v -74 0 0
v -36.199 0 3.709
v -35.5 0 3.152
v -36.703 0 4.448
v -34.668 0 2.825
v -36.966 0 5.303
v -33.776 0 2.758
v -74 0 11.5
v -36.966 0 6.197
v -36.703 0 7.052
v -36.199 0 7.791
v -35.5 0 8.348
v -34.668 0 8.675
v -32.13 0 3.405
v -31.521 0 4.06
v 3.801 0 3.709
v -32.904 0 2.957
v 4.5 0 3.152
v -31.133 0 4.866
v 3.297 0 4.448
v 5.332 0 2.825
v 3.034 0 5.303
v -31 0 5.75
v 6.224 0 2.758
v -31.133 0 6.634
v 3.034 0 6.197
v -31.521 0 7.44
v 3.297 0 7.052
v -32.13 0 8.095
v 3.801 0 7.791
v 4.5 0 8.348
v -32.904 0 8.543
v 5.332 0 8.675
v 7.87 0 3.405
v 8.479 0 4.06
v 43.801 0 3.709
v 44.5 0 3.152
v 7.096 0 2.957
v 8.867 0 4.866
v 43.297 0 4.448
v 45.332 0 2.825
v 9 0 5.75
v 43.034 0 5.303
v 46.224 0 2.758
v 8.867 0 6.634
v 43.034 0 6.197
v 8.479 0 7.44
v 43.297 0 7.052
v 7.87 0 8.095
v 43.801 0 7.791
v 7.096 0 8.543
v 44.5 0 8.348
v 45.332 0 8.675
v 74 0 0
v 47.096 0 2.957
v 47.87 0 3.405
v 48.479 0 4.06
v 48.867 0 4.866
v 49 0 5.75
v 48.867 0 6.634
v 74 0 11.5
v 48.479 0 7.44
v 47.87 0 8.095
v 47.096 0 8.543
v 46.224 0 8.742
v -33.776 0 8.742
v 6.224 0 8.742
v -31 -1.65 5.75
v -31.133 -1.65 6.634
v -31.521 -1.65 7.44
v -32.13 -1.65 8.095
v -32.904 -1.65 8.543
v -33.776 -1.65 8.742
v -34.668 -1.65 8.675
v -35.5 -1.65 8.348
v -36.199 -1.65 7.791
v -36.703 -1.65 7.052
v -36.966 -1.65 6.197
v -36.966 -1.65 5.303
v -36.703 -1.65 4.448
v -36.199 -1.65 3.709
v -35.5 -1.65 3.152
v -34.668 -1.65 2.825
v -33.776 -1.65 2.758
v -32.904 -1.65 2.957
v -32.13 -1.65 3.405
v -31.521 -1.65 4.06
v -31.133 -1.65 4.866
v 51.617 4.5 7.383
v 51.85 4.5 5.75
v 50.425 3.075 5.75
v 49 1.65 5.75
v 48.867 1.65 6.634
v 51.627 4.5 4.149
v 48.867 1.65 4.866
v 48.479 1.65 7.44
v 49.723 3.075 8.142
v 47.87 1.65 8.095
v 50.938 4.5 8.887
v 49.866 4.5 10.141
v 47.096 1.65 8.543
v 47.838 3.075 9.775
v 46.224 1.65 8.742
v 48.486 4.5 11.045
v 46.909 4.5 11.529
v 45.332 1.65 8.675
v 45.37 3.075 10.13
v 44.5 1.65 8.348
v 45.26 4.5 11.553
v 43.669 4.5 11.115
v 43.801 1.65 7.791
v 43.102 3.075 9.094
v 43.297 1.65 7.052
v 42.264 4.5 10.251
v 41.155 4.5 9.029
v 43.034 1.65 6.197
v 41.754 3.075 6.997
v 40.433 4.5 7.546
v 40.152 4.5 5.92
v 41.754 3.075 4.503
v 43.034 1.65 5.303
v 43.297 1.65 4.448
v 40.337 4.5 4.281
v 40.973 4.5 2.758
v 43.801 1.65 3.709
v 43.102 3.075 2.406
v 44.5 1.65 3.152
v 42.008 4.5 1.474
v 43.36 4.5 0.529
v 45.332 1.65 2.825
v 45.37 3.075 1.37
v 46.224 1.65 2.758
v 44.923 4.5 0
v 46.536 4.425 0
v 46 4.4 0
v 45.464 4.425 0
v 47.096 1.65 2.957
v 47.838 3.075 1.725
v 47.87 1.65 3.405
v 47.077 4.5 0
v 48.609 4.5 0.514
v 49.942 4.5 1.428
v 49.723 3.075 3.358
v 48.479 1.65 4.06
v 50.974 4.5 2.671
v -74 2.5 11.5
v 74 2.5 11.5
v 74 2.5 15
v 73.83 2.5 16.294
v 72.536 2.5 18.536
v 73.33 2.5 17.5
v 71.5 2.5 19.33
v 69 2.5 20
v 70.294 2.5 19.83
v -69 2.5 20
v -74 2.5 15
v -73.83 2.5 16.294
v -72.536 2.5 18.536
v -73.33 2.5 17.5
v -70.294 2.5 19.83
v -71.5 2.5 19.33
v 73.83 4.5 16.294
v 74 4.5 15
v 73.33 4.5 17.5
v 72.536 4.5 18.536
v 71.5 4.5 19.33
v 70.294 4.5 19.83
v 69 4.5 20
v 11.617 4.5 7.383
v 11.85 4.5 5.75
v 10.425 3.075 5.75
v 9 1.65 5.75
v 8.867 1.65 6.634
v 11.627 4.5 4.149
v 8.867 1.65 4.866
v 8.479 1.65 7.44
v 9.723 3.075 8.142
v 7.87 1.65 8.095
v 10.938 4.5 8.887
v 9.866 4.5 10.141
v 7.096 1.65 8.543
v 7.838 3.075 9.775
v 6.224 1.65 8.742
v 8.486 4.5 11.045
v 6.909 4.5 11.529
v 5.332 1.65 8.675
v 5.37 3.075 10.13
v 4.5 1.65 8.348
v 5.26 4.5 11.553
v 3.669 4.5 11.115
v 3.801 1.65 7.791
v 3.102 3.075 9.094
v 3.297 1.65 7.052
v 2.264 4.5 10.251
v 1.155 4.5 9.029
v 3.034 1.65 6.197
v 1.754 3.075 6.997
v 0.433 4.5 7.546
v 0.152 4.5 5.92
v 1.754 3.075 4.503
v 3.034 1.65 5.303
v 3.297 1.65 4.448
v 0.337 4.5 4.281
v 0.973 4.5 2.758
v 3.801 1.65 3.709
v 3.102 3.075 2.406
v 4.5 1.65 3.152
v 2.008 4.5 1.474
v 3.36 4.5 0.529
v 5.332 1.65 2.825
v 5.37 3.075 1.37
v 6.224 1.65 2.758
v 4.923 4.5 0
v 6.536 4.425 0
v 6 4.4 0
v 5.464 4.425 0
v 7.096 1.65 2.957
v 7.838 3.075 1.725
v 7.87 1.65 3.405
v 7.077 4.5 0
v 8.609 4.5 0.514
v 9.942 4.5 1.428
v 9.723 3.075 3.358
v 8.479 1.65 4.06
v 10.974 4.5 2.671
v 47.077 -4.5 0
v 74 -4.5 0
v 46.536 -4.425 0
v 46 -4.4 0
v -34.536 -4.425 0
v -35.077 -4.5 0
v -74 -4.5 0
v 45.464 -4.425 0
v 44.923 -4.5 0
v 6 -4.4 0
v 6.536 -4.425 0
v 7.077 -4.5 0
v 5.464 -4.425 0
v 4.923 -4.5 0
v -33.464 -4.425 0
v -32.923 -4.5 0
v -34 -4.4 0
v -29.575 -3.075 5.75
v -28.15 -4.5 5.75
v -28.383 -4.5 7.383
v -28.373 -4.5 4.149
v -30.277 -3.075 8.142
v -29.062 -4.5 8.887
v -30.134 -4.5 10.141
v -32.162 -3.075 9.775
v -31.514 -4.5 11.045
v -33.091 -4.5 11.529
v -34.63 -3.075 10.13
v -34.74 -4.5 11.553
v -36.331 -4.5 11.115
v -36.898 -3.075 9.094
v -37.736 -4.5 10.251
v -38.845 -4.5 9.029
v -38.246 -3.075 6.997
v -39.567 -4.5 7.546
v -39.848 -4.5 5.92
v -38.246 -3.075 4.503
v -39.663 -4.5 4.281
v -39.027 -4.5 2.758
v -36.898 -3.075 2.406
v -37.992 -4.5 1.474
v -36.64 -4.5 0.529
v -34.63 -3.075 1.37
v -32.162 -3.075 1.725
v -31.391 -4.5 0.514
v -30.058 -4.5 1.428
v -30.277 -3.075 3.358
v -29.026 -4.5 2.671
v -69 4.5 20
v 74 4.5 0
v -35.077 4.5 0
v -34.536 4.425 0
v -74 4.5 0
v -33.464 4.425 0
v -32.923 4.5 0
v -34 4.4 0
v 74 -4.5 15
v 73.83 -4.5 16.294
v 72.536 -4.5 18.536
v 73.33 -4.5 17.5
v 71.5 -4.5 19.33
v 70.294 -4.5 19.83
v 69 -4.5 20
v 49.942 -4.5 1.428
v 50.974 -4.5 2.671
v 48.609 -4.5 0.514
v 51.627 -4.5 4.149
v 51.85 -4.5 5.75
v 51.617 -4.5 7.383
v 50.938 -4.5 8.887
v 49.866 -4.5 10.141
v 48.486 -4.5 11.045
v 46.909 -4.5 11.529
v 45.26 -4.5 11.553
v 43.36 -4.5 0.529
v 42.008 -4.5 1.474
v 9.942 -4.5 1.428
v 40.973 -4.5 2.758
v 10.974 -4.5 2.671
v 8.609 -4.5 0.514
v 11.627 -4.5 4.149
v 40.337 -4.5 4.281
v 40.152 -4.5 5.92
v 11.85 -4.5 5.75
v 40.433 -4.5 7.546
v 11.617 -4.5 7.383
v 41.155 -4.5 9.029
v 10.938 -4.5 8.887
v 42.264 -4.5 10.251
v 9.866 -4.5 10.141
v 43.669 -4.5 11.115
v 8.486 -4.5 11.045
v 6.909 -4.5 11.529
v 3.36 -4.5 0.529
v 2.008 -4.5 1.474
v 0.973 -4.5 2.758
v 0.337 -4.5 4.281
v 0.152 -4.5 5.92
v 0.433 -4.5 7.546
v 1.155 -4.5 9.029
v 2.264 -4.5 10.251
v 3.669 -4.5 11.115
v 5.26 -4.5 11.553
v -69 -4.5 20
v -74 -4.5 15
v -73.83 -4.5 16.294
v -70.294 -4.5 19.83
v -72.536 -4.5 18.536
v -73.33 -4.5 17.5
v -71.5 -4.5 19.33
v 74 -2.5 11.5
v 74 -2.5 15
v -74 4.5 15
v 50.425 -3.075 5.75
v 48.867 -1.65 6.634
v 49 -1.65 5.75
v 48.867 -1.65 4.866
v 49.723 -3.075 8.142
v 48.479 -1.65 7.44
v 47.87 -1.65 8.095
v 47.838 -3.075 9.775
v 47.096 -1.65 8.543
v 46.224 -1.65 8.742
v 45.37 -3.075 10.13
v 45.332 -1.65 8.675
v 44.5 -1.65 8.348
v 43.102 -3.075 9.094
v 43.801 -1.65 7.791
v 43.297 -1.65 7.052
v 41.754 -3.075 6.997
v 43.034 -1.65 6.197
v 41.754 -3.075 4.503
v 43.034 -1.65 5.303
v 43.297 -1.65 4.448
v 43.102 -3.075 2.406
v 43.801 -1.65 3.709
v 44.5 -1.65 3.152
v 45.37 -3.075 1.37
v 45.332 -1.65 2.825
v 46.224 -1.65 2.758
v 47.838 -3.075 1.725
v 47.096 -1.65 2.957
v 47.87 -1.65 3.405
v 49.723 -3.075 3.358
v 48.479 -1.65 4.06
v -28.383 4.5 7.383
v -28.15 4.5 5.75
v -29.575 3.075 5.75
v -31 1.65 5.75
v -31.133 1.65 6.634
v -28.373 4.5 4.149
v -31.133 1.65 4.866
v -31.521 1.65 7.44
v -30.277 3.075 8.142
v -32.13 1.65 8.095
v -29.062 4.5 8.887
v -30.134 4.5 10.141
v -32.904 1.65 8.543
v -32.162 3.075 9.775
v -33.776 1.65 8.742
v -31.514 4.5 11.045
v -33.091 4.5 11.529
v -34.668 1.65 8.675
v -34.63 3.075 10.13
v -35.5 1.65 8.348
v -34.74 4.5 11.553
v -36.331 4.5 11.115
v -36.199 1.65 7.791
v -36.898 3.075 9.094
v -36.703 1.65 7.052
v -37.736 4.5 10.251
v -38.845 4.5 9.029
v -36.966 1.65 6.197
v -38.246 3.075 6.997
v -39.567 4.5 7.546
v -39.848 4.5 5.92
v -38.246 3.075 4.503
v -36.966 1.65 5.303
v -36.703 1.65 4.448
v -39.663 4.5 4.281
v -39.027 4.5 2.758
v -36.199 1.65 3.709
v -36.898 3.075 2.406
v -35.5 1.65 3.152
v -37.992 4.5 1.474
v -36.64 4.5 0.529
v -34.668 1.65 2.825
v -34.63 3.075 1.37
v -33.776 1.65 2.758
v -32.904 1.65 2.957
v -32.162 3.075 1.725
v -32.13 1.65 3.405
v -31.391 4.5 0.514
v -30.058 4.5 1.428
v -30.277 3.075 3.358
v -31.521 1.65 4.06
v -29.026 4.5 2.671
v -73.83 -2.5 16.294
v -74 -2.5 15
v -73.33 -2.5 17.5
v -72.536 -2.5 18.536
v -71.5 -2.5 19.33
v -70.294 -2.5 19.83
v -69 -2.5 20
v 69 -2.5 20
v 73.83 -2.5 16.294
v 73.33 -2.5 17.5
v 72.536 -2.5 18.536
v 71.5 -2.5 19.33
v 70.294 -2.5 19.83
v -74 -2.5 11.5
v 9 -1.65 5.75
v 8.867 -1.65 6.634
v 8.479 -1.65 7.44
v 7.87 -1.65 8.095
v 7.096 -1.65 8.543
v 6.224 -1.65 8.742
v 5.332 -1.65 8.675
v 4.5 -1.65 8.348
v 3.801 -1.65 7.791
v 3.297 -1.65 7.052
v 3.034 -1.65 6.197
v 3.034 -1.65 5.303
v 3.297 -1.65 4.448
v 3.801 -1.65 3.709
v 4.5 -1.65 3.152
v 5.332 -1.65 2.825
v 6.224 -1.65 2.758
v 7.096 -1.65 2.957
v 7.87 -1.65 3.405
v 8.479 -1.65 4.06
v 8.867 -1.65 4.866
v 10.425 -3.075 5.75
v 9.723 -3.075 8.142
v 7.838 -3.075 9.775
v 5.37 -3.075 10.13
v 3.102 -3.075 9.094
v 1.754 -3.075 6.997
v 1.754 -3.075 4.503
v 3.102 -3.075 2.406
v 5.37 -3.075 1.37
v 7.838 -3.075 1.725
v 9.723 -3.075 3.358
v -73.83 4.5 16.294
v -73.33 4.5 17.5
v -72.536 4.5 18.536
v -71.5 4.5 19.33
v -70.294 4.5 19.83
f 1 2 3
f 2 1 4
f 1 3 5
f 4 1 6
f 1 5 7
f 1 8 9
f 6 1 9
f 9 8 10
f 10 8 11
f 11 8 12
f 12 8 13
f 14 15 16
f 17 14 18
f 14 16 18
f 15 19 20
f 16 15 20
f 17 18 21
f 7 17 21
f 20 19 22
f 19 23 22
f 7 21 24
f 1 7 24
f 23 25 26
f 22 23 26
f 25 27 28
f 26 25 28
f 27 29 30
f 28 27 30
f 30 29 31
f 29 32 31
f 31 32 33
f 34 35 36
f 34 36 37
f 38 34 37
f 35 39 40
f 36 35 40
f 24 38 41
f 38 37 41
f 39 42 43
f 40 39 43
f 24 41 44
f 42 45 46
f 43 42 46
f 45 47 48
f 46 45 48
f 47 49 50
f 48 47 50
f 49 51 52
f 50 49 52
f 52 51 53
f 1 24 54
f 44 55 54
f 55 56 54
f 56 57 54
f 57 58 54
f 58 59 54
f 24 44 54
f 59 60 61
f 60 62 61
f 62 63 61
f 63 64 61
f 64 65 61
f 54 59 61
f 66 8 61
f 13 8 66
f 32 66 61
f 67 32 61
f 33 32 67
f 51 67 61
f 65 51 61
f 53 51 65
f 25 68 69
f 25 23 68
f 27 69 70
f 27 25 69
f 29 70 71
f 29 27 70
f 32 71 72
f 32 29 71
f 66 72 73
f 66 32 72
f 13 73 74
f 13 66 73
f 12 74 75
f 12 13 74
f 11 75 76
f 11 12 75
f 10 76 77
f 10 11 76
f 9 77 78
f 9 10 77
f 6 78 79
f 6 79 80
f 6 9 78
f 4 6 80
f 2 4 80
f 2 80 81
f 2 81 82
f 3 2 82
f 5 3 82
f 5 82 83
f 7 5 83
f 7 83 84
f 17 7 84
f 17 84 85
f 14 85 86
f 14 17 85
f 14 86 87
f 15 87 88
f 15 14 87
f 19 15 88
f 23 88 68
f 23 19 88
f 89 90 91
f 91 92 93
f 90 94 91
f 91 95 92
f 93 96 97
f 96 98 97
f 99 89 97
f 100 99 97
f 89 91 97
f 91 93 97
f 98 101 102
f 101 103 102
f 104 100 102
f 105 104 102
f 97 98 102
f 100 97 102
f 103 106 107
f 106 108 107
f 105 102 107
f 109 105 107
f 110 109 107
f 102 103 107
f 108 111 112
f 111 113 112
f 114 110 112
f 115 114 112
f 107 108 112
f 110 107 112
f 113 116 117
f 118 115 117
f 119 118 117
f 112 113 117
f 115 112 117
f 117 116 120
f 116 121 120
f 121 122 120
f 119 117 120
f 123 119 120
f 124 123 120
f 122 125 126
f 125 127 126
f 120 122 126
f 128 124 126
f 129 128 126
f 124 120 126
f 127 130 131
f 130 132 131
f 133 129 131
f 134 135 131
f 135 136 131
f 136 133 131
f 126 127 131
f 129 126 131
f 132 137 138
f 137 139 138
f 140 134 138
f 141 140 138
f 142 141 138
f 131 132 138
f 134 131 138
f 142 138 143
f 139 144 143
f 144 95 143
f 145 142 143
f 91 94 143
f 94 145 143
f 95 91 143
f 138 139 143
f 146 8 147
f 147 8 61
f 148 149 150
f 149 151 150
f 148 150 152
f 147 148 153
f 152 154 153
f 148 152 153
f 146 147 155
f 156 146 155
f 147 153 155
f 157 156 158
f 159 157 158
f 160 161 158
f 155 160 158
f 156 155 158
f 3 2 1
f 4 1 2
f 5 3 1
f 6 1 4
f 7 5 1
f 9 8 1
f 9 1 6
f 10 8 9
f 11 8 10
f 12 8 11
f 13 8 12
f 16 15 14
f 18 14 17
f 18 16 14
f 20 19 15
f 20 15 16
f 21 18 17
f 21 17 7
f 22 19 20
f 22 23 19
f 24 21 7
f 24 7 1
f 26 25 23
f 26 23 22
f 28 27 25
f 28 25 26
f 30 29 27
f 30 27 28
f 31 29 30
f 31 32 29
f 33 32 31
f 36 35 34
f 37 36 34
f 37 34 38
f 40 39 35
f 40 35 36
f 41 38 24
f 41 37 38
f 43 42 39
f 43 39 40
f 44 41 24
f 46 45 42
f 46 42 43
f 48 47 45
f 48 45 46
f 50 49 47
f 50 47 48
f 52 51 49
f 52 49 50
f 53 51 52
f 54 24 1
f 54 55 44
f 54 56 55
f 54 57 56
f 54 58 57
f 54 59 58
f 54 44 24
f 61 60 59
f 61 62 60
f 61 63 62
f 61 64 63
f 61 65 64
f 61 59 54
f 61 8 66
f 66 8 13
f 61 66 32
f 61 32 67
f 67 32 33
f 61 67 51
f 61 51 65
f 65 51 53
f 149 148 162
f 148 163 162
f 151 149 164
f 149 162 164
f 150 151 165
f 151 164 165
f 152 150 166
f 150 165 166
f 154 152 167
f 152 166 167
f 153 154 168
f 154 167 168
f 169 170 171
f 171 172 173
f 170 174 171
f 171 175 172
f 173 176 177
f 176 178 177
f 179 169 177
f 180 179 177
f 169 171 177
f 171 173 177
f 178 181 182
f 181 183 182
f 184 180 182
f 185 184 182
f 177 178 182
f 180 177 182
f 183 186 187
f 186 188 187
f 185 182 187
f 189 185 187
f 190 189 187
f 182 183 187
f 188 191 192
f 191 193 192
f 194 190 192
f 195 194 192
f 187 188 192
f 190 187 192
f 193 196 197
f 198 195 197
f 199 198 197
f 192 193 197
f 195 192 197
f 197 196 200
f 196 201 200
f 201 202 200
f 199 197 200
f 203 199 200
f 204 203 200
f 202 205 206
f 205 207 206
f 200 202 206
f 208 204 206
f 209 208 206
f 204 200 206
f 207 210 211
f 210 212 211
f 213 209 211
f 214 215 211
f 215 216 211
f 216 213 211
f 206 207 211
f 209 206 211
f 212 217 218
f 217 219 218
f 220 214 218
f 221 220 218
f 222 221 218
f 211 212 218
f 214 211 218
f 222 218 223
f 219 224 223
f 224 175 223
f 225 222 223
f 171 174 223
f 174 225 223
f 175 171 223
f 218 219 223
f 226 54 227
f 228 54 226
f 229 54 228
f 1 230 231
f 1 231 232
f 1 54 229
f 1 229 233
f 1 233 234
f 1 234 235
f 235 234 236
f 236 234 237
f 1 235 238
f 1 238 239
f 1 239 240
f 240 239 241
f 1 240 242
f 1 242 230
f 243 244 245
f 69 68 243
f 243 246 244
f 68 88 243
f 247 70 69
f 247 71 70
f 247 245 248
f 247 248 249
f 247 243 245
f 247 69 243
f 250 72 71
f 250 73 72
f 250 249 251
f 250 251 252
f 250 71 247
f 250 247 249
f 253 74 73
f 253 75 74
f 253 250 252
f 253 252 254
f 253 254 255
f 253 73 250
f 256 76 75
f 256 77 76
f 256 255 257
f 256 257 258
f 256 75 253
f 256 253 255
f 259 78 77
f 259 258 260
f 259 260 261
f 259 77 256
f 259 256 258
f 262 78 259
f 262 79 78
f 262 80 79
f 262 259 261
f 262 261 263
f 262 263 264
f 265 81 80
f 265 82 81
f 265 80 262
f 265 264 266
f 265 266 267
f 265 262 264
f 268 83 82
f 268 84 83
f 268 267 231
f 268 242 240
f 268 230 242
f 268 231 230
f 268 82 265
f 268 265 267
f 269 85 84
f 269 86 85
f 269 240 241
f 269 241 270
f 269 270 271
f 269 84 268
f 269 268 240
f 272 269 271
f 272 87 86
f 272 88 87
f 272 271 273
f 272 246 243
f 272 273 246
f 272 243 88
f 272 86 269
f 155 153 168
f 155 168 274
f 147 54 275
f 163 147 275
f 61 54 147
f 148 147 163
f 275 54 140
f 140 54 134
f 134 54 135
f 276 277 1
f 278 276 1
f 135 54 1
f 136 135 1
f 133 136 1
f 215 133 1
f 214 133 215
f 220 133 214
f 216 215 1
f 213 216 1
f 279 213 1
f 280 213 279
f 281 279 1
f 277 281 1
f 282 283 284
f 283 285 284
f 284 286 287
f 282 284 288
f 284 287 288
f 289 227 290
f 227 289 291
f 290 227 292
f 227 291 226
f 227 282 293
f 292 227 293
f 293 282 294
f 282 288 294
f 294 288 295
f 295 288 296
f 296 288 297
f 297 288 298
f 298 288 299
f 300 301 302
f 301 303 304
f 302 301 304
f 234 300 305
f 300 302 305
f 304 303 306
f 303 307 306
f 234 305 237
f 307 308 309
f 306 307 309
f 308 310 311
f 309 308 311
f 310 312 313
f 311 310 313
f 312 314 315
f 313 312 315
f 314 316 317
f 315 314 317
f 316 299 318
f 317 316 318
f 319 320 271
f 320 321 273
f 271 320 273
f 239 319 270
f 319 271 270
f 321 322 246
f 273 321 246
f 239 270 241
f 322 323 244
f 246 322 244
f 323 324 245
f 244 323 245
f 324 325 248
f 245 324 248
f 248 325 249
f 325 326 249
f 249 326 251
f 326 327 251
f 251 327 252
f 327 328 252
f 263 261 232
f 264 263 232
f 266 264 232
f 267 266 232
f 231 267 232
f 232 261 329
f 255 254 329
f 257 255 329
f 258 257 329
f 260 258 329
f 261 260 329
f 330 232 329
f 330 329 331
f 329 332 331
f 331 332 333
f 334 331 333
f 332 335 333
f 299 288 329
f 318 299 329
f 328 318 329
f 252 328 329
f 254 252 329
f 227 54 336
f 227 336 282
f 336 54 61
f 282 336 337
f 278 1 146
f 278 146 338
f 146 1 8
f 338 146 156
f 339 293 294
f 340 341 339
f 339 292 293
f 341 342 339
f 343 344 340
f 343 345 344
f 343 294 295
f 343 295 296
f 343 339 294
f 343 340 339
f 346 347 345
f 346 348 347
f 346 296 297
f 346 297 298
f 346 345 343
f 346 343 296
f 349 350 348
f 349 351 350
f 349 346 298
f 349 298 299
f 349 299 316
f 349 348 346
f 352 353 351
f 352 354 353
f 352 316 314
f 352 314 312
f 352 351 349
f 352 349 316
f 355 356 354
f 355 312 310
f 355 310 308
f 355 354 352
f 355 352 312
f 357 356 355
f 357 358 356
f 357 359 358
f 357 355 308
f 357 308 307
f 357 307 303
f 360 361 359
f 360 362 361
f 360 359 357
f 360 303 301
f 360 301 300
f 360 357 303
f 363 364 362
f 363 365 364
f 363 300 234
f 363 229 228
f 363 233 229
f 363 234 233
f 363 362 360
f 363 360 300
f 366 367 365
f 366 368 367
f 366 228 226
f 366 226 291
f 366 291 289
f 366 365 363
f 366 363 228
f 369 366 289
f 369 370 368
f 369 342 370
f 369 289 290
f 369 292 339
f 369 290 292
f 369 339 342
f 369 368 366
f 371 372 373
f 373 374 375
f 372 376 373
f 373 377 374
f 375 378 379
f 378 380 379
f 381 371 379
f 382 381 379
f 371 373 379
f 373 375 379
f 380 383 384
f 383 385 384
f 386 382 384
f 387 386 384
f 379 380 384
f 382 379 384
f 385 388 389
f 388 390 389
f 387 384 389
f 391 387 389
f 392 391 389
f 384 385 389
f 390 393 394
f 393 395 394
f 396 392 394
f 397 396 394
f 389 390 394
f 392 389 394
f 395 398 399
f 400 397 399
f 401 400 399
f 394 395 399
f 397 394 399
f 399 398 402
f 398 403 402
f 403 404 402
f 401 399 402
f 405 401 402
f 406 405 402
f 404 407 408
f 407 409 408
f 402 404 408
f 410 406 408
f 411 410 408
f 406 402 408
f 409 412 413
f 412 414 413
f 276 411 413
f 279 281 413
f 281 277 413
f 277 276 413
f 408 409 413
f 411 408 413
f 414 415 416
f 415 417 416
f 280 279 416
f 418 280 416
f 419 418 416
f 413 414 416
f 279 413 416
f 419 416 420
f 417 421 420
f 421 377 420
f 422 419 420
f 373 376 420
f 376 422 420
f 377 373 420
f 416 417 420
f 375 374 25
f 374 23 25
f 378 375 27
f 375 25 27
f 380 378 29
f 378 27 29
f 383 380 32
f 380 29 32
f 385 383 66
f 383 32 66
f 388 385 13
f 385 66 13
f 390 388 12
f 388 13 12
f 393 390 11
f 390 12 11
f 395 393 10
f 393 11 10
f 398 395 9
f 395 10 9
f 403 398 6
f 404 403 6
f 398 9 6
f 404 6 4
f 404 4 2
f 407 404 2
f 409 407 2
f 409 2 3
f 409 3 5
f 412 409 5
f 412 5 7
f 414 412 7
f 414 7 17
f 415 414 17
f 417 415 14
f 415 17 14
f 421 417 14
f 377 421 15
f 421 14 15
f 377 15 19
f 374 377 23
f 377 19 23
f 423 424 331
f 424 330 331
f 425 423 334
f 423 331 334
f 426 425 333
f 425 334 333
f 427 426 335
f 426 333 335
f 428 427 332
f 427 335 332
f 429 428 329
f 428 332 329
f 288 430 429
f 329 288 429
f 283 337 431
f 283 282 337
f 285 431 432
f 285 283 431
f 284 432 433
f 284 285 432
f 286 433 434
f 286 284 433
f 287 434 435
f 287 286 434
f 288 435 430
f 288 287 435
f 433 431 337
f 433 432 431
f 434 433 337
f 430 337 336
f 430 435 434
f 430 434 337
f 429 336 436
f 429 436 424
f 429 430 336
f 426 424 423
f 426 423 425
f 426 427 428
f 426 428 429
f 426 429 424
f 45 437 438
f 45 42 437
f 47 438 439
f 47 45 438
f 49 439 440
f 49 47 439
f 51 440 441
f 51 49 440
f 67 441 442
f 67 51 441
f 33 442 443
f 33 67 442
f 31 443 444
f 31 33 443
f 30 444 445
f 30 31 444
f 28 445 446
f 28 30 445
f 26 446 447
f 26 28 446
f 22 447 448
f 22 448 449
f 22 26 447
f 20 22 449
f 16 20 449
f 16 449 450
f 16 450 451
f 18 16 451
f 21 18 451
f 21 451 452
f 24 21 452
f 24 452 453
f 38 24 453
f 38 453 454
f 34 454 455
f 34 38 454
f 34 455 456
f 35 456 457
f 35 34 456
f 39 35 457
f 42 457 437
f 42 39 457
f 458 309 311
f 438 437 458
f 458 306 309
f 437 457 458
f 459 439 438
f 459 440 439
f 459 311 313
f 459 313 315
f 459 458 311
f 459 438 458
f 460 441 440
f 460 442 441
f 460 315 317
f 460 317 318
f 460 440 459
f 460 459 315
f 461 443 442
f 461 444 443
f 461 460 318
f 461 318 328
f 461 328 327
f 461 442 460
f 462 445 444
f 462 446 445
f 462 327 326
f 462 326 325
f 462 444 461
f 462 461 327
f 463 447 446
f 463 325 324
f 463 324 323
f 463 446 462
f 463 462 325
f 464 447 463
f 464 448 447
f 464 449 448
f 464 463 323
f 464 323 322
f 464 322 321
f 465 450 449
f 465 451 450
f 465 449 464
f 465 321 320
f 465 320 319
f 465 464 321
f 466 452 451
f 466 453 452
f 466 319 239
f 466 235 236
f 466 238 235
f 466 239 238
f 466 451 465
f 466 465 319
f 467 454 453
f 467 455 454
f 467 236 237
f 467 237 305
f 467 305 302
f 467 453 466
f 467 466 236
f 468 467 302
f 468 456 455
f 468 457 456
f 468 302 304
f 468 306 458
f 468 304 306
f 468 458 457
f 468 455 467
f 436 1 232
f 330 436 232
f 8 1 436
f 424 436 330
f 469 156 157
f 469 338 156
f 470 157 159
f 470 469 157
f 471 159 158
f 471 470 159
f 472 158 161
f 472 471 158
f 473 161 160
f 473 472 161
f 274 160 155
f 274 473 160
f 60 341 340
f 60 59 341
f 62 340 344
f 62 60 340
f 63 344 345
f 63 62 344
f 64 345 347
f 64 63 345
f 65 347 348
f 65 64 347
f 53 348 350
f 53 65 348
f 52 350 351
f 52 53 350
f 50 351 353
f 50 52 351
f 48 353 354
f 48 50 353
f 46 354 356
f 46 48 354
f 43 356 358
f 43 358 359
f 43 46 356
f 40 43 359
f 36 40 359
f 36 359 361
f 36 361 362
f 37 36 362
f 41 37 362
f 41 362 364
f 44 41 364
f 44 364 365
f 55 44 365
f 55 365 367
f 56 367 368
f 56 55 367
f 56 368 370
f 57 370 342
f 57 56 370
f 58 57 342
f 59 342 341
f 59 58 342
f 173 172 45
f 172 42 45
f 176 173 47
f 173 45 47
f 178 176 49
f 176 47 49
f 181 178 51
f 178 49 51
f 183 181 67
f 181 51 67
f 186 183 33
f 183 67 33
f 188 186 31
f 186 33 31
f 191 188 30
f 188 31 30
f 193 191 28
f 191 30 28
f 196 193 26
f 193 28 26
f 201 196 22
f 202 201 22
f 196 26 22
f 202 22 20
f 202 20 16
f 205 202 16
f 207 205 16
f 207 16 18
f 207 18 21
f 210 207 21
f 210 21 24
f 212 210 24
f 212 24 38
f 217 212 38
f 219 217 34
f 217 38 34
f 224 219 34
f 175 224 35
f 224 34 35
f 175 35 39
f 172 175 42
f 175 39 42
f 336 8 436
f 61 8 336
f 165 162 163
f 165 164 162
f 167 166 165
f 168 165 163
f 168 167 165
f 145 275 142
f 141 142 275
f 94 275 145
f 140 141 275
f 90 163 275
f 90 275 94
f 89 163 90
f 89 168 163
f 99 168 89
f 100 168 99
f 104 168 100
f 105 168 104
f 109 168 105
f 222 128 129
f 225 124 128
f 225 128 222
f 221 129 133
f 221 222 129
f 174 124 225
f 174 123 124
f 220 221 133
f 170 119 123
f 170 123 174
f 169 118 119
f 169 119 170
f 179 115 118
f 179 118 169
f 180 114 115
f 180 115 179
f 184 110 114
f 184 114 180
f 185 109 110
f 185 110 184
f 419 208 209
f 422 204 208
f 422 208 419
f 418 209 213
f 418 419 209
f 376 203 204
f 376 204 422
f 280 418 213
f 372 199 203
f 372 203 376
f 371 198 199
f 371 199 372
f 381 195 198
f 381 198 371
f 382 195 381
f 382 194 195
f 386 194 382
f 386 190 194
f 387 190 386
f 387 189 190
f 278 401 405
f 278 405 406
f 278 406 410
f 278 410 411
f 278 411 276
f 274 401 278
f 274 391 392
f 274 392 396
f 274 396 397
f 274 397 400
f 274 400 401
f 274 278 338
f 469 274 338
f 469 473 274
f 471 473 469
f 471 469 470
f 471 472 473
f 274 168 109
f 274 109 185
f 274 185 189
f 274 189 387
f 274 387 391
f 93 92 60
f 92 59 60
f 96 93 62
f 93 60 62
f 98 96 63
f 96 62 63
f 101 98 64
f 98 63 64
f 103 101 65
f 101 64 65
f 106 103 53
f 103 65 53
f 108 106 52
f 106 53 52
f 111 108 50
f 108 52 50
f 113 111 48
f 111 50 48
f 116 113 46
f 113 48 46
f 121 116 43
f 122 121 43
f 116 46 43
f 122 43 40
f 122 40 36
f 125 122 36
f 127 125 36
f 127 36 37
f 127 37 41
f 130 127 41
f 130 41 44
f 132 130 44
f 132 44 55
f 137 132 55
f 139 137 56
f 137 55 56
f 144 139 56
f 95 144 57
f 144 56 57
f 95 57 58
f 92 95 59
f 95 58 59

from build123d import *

# Parameters (mm, degrees)
F0_W           = 148
F0_H           = 11.5
F1_DEPTH       = 2.5
F2_W           = 148
F2_H           = 20
F3_DEPTH       = 2
F5_D           = 6
F5_CSINK_D     = 11.7
F5_CSINK_ANGLE = 90
F6_R           = 5


with BuildPart() as f1:
    # F0 (on Front) → F1 (new body)
    with BuildSketch(Plane.XZ):
        with Locations((0, 5.75)):
            Rectangle(F0_W, F0_H)
    extrude(amount=-F1_DEPTH)

    # F2 (on face) → F3 (join)
    with BuildSketch(Plane(origin=(0, 2.5, 0), x_dir=(-1, 0, 0), z_dir=(0, 1, 0))):
        with Locations((0, 10)):
            Rectangle(F2_W, F2_H)
    extrude(amount=F3_DEPTH)

    # F5 (through all)
    with Locations(Plane(origin=(0, 4.5, 0), x_dir=(-1, 0, 0), z_dir=(0, 1, 0))):
        with Locations((-46, 5.75), (-6, 5.75), (34, 5.75)):
            CounterSinkHole(F5_D / 2, F5_CSINK_D / 2, counter_sink_angle=F5_CSINK_ANGLE)

    # F6
    f6_edges = [f1.edges().sort_by_distance(p)[0] for p in [
        (-74, 3.5, 20),
        (74, 3.5, 20),
    ]]
    fillet(f6_edges, radius=F6_R)


with BuildPart() as f7_1:
    # F7: instance of F1
    add(f1.part.mirror(Plane.XZ))


solid = Compound([f1.part, f7_1.part])
